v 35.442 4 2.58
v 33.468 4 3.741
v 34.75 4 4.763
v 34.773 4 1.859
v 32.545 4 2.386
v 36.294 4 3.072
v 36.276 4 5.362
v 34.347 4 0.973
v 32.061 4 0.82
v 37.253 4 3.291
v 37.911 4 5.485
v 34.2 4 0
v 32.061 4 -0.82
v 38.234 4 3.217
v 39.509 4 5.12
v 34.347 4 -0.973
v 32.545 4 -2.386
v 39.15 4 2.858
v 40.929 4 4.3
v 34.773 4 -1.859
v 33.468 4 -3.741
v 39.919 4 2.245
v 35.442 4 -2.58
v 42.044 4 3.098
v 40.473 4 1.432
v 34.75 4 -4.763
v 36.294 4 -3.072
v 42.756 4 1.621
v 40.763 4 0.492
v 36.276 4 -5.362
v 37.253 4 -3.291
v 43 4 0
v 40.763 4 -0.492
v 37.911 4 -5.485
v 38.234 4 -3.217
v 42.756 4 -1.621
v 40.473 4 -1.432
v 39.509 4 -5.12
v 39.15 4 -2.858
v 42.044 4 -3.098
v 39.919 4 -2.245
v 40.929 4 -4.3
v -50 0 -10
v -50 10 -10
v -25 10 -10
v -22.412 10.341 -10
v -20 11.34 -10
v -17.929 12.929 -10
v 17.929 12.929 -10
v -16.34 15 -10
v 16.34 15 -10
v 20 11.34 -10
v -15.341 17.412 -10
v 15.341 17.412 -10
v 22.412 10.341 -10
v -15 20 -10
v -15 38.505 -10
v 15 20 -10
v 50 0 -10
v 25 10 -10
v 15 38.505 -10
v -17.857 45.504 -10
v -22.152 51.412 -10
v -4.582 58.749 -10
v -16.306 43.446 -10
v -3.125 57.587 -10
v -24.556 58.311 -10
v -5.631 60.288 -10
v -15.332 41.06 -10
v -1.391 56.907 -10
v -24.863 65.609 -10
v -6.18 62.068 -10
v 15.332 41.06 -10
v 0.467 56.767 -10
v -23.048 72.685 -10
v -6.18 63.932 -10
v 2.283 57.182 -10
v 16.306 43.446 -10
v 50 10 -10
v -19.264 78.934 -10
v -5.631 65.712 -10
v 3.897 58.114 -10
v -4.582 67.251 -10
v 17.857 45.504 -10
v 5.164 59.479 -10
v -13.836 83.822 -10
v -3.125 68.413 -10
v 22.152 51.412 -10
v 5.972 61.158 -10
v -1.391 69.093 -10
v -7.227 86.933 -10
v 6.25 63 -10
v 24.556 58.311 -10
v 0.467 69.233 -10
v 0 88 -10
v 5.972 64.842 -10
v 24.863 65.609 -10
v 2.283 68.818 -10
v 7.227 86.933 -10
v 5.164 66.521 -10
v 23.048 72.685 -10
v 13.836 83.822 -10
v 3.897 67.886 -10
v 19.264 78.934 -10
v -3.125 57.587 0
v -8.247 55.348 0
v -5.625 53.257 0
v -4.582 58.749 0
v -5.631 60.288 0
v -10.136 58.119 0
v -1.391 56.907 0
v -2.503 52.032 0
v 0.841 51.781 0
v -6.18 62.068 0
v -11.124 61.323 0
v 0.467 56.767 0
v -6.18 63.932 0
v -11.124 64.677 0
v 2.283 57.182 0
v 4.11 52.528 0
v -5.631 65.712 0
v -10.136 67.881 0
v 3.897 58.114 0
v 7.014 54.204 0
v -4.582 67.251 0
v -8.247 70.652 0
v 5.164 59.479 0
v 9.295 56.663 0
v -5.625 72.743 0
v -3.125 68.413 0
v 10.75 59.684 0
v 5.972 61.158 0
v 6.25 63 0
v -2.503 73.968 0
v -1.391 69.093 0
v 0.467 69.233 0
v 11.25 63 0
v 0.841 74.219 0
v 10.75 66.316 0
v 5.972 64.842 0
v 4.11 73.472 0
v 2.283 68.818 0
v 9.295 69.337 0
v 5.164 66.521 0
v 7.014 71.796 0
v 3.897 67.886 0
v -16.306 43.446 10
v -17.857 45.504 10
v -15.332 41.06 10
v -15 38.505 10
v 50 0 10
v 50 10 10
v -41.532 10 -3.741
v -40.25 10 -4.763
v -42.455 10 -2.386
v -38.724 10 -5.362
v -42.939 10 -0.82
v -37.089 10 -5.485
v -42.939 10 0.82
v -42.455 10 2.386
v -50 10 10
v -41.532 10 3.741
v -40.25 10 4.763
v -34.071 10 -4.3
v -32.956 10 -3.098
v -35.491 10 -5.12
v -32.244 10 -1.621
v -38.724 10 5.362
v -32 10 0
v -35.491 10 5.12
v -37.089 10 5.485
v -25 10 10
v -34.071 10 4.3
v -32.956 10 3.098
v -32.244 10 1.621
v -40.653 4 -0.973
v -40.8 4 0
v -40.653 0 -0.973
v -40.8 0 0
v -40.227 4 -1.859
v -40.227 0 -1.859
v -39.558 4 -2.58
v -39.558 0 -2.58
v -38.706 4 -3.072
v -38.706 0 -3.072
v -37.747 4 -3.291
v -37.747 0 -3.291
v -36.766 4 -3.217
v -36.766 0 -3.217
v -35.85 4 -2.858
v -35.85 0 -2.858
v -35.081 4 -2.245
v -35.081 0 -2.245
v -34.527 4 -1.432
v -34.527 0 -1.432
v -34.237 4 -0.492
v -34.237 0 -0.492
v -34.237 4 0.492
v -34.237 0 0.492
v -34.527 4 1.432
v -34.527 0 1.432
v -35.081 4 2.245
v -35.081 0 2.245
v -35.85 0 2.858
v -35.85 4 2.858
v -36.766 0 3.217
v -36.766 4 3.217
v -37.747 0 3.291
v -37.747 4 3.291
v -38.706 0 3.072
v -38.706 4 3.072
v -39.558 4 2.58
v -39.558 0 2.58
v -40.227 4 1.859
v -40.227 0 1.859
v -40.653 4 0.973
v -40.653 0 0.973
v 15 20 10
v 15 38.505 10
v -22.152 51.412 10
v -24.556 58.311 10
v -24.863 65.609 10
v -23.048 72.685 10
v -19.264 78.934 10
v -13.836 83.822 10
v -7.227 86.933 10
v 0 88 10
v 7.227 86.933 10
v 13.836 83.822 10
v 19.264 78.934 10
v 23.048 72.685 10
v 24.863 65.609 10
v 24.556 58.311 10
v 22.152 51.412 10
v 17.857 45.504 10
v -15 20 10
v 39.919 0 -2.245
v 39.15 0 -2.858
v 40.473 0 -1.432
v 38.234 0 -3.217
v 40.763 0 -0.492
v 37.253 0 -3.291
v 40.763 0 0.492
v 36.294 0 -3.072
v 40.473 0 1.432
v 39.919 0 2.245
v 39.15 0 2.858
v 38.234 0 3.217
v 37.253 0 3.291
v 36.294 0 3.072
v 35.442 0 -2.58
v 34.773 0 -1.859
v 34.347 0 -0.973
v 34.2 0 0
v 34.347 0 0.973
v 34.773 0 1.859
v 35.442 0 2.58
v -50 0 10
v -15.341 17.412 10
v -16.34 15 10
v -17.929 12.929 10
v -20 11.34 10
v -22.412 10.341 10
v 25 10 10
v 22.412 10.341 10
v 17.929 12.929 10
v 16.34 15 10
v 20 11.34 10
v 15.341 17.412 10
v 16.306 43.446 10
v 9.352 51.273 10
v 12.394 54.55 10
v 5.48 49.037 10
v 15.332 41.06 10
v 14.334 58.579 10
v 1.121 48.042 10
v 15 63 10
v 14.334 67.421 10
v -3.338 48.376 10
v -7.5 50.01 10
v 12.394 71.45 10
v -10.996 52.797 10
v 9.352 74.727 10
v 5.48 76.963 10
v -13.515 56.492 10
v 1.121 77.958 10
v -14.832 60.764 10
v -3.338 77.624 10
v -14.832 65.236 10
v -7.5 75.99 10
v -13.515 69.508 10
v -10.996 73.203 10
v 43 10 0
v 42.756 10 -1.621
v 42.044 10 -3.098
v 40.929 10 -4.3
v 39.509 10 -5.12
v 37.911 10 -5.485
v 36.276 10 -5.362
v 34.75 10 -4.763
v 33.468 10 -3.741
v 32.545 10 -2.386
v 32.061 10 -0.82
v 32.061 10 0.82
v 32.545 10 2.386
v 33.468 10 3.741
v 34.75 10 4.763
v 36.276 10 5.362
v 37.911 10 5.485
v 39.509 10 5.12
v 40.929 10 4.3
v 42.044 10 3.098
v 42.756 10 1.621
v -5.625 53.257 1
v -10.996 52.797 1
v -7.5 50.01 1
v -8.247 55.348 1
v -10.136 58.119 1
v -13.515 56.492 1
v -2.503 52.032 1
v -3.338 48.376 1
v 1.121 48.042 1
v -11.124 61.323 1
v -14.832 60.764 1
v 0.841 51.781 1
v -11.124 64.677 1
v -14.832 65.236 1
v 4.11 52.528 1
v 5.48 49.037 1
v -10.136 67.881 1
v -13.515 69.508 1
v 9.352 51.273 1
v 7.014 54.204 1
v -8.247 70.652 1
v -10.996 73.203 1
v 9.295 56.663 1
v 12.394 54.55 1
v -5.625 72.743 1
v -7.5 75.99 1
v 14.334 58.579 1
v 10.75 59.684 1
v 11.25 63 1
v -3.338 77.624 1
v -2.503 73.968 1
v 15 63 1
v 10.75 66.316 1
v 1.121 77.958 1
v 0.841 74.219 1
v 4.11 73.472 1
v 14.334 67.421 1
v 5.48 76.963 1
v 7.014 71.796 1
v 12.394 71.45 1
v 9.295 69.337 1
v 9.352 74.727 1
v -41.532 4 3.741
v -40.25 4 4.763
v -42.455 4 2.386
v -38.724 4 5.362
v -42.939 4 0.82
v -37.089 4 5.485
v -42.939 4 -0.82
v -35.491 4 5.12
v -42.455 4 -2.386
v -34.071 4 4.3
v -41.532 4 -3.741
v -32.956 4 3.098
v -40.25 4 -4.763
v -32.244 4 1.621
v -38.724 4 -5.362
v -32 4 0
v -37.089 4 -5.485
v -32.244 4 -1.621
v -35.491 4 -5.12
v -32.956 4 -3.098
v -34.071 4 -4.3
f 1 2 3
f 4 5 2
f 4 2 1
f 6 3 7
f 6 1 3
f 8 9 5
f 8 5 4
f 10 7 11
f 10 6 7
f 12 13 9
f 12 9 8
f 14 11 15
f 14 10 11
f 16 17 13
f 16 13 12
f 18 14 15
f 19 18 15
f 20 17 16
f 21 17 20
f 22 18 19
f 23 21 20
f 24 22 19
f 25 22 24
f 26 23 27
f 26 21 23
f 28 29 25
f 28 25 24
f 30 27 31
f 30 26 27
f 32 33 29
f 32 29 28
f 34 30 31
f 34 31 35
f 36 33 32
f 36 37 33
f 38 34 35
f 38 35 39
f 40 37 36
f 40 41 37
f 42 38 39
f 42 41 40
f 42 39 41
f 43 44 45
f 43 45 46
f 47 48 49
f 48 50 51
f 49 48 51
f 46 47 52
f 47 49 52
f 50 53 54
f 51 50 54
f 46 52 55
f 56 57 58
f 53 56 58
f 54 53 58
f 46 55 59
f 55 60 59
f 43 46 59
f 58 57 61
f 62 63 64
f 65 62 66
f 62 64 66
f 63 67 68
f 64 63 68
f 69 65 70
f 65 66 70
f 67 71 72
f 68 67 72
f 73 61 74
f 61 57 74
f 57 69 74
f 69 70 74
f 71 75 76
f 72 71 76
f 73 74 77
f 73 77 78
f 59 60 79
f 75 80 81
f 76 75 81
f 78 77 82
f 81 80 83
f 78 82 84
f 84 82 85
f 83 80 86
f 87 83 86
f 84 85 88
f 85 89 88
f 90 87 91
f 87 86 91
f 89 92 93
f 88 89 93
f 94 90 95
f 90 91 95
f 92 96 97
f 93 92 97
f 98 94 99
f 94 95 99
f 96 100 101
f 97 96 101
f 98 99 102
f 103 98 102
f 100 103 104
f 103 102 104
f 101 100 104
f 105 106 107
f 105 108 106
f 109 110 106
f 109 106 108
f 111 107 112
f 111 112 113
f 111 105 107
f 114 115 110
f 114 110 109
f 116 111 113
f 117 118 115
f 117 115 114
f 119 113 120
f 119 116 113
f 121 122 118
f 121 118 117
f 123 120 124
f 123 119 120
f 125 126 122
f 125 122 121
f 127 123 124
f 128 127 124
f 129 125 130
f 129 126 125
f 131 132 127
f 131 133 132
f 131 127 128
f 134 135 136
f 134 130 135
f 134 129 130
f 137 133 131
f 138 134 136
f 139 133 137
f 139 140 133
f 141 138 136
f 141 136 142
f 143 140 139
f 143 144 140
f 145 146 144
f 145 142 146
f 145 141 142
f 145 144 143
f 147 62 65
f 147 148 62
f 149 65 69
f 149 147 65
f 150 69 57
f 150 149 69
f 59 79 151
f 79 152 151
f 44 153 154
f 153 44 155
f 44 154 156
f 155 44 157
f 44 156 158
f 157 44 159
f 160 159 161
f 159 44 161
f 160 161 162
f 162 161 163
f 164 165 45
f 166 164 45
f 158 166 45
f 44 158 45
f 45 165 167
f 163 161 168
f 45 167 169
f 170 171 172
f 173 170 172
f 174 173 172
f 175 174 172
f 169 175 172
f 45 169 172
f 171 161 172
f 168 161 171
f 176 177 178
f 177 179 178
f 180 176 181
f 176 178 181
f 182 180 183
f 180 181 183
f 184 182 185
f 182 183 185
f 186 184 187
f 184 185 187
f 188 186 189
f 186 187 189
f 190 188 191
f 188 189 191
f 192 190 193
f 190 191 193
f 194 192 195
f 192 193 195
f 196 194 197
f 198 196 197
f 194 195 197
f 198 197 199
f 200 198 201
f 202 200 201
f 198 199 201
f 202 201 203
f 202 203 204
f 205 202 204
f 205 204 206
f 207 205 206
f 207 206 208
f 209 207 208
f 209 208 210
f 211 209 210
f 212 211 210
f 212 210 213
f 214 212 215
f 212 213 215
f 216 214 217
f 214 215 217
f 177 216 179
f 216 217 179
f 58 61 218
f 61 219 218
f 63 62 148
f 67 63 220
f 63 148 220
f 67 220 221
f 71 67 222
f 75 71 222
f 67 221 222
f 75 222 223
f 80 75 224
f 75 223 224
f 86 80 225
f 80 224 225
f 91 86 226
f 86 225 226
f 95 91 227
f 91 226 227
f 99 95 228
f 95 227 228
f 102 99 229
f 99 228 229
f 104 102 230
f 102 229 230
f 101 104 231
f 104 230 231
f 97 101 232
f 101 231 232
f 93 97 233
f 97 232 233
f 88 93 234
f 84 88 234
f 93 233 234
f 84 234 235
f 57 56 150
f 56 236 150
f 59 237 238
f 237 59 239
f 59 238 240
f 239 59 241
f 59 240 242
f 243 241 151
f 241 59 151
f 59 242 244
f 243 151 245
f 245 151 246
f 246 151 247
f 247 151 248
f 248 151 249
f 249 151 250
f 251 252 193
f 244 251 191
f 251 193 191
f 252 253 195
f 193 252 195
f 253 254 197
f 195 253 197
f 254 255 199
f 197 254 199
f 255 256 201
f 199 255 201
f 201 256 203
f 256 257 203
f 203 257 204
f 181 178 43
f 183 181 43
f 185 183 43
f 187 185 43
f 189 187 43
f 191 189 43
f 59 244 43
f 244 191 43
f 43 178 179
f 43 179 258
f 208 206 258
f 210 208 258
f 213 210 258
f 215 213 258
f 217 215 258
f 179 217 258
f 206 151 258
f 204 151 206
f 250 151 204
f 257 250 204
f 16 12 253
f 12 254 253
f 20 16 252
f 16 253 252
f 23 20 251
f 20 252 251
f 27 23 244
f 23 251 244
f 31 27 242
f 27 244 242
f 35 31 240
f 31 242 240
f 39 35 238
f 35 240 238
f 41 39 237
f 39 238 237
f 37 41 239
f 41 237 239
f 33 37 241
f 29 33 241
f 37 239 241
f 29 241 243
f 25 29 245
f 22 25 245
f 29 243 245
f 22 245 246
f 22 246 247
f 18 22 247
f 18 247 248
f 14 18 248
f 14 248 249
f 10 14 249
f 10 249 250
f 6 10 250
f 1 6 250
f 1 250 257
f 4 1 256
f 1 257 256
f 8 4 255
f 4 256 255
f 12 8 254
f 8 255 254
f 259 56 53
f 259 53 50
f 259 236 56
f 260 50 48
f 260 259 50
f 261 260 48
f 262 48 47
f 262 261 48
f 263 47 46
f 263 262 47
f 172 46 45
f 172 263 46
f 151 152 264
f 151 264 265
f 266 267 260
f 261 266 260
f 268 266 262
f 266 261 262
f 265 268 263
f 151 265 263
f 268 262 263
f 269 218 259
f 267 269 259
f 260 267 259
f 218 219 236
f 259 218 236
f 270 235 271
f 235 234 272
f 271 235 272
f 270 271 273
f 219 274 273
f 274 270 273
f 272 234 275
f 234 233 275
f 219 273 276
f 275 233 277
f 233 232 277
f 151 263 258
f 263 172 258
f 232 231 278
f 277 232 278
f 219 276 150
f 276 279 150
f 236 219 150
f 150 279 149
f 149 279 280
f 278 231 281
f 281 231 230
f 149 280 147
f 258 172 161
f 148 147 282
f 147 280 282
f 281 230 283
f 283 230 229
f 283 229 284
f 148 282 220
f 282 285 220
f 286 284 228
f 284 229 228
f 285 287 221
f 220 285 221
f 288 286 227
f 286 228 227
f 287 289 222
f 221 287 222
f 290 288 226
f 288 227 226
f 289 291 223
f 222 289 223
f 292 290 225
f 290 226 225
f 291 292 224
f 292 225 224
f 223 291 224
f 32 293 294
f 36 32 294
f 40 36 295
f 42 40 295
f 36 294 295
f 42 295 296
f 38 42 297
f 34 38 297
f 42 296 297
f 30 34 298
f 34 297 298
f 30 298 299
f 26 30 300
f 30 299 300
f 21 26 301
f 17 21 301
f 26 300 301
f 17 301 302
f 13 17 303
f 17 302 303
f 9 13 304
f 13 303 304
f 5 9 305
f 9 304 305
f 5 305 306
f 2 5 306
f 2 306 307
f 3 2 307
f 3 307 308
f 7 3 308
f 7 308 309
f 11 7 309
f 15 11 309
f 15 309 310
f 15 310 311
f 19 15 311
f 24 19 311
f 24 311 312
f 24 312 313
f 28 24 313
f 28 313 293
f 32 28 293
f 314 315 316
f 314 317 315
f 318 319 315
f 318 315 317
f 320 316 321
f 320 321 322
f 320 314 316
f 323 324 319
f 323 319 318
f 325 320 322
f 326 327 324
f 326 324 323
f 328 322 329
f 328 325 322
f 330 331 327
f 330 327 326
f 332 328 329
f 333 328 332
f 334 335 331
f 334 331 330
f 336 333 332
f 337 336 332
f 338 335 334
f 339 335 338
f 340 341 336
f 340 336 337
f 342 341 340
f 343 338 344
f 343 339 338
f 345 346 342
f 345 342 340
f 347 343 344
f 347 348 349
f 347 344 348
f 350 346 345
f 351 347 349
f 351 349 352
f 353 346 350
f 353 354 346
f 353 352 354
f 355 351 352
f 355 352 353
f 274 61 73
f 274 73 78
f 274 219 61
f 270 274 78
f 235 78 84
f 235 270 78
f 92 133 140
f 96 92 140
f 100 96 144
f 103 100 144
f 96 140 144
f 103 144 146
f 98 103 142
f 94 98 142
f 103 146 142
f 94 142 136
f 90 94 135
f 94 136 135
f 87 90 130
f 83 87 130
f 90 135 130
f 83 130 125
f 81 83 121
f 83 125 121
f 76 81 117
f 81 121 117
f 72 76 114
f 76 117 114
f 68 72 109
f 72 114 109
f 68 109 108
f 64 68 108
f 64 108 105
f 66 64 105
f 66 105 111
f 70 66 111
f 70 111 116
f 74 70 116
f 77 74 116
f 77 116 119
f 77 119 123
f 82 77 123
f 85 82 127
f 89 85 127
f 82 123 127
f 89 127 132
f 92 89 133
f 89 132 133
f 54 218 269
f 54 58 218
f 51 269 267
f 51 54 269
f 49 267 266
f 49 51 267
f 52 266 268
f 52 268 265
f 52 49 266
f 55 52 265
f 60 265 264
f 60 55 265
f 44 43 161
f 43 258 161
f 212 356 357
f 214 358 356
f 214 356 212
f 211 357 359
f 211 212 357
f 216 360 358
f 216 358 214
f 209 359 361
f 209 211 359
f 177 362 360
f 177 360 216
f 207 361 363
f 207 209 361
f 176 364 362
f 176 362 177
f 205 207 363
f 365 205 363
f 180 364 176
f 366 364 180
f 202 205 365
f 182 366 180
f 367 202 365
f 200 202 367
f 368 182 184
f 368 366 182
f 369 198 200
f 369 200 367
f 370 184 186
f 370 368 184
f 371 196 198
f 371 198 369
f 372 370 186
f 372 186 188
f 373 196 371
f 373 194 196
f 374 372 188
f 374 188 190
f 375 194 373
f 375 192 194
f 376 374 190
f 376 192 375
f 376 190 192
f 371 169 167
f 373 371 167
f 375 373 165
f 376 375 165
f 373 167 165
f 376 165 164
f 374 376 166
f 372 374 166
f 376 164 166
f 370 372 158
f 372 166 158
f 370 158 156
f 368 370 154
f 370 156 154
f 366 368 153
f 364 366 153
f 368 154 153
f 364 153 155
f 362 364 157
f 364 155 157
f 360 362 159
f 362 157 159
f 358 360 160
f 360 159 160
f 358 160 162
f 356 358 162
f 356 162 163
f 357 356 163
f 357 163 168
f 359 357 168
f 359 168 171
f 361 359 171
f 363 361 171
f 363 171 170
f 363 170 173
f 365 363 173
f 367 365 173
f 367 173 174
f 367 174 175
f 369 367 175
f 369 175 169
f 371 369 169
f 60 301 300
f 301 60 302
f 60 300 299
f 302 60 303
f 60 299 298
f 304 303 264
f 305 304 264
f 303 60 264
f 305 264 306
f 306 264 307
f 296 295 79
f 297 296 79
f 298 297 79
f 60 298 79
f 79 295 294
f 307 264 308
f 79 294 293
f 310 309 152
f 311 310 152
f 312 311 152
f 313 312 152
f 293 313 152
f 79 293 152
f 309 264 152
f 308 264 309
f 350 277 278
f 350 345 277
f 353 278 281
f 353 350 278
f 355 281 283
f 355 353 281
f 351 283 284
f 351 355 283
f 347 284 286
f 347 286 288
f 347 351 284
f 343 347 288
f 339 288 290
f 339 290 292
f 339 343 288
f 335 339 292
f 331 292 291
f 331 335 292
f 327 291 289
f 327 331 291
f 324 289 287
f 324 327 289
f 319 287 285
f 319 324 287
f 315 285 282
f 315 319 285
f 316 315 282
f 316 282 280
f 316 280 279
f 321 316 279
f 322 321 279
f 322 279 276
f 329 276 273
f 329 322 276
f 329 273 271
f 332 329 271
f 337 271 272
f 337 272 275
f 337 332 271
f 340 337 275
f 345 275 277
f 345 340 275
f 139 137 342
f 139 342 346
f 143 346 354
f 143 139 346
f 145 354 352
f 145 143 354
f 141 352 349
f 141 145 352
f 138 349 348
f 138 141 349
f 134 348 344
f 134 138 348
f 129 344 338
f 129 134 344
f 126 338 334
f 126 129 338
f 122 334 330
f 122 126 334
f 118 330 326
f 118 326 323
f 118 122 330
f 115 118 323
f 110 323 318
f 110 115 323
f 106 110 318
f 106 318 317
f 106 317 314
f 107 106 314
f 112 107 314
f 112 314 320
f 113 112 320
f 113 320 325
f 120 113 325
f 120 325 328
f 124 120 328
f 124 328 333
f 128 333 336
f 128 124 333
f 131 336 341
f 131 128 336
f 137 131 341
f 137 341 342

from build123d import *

# Parameters (mm, degrees)
SKETCH1_R                      = 15
BOSS_EXTRUDE1_DEPTH            = 10
SKETCH2_R                      = 15
SKETCH2_R_2                    = 6.25
BOSS_EXTRUDE2_DEPTH            = 10
FILLET1_R                      = 10
CBORE_FOR_M6_SHCS1_D           = 6.6
CBORE_FOR_M6_SHCS1_CBORE_D     = 11
CBORE_FOR_M6_SHCS1_CBORE_DEPTH = 6
SKETCH5_R                      = 15
SKETCH5_R_2                    = 11.25
BOSS_EXTRUDE3_DEPTH            = 1


with BuildPart() as part:
    # Sketch1 → Boss-Extrude1 (new, symmetric)
    with BuildSketch(Plane.XY):
        with BuildLine():
            Line((15, 43), (15, 10))
            Line((15, 10), (50, 10))
            Line((50, 10), (50, 0))
            Line((50, 0), (-50, 0))
            Line((-50, 0), (-50, 10))
            Line((-50, 10), (-15, 10))
            Line((-15, 10), (-15, 43))
            ThreePointArc((-15, 43), (0, 88), (15, 43))
        make_face()
        with Locations((0, 63)):
            Circle(SKETCH1_R, mode=Mode.SUBTRACT)
    extrude(amount=BOSS_EXTRUDE1_DEPTH, both=True)

    # Sketch2 → Boss-Extrude2 (add, through all)
    with BuildSketch(Plane.XY):
        with Locations((0, 63)):
            Circle(SKETCH2_R)
        with Locations((0, 63)):
            Circle(SKETCH2_R_2, mode=Mode.SUBTRACT)
    extrude(amount=-BOSS_EXTRUDE2_DEPTH)

    # Fillet1
    fillet1_edges = [part.edges().sort_by_distance(p)[0] for p in [
        (-15, 10, 0),
        (-15, 43, 0),
        (15, 43, 0),
        (15, 10, 0),
    ]]
    fillet(fillet1_edges, radius=FILLET1_R)

    # CBORE for M6 SHCS1 (through all)
    with Locations(Plane(origin=(0, 10, 0), x_dir=(1, 0, 0), z_dir=(0, 1, 0))):
        with Locations((-37.5, 0), (37.5, 0)):
            CounterBoreHole(CBORE_FOR_M6_SHCS1_D / 2, CBORE_FOR_M6_SHCS1_CBORE_D / 2, CBORE_FOR_M6_SHCS1_CBORE_DEPTH)

    # Sketch5 → Boss-Extrude3 (add)
    with BuildSketch(Plane.XY):
        with Locations((0, 63)):
            Circle(SKETCH5_R)
        with Locations((0, 63)):
            Circle(SKETCH5_R_2, mode=Mode.SUBTRACT)
    extrude(amount=BOSS_EXTRUDE3_DEPTH)


solid = part.part
